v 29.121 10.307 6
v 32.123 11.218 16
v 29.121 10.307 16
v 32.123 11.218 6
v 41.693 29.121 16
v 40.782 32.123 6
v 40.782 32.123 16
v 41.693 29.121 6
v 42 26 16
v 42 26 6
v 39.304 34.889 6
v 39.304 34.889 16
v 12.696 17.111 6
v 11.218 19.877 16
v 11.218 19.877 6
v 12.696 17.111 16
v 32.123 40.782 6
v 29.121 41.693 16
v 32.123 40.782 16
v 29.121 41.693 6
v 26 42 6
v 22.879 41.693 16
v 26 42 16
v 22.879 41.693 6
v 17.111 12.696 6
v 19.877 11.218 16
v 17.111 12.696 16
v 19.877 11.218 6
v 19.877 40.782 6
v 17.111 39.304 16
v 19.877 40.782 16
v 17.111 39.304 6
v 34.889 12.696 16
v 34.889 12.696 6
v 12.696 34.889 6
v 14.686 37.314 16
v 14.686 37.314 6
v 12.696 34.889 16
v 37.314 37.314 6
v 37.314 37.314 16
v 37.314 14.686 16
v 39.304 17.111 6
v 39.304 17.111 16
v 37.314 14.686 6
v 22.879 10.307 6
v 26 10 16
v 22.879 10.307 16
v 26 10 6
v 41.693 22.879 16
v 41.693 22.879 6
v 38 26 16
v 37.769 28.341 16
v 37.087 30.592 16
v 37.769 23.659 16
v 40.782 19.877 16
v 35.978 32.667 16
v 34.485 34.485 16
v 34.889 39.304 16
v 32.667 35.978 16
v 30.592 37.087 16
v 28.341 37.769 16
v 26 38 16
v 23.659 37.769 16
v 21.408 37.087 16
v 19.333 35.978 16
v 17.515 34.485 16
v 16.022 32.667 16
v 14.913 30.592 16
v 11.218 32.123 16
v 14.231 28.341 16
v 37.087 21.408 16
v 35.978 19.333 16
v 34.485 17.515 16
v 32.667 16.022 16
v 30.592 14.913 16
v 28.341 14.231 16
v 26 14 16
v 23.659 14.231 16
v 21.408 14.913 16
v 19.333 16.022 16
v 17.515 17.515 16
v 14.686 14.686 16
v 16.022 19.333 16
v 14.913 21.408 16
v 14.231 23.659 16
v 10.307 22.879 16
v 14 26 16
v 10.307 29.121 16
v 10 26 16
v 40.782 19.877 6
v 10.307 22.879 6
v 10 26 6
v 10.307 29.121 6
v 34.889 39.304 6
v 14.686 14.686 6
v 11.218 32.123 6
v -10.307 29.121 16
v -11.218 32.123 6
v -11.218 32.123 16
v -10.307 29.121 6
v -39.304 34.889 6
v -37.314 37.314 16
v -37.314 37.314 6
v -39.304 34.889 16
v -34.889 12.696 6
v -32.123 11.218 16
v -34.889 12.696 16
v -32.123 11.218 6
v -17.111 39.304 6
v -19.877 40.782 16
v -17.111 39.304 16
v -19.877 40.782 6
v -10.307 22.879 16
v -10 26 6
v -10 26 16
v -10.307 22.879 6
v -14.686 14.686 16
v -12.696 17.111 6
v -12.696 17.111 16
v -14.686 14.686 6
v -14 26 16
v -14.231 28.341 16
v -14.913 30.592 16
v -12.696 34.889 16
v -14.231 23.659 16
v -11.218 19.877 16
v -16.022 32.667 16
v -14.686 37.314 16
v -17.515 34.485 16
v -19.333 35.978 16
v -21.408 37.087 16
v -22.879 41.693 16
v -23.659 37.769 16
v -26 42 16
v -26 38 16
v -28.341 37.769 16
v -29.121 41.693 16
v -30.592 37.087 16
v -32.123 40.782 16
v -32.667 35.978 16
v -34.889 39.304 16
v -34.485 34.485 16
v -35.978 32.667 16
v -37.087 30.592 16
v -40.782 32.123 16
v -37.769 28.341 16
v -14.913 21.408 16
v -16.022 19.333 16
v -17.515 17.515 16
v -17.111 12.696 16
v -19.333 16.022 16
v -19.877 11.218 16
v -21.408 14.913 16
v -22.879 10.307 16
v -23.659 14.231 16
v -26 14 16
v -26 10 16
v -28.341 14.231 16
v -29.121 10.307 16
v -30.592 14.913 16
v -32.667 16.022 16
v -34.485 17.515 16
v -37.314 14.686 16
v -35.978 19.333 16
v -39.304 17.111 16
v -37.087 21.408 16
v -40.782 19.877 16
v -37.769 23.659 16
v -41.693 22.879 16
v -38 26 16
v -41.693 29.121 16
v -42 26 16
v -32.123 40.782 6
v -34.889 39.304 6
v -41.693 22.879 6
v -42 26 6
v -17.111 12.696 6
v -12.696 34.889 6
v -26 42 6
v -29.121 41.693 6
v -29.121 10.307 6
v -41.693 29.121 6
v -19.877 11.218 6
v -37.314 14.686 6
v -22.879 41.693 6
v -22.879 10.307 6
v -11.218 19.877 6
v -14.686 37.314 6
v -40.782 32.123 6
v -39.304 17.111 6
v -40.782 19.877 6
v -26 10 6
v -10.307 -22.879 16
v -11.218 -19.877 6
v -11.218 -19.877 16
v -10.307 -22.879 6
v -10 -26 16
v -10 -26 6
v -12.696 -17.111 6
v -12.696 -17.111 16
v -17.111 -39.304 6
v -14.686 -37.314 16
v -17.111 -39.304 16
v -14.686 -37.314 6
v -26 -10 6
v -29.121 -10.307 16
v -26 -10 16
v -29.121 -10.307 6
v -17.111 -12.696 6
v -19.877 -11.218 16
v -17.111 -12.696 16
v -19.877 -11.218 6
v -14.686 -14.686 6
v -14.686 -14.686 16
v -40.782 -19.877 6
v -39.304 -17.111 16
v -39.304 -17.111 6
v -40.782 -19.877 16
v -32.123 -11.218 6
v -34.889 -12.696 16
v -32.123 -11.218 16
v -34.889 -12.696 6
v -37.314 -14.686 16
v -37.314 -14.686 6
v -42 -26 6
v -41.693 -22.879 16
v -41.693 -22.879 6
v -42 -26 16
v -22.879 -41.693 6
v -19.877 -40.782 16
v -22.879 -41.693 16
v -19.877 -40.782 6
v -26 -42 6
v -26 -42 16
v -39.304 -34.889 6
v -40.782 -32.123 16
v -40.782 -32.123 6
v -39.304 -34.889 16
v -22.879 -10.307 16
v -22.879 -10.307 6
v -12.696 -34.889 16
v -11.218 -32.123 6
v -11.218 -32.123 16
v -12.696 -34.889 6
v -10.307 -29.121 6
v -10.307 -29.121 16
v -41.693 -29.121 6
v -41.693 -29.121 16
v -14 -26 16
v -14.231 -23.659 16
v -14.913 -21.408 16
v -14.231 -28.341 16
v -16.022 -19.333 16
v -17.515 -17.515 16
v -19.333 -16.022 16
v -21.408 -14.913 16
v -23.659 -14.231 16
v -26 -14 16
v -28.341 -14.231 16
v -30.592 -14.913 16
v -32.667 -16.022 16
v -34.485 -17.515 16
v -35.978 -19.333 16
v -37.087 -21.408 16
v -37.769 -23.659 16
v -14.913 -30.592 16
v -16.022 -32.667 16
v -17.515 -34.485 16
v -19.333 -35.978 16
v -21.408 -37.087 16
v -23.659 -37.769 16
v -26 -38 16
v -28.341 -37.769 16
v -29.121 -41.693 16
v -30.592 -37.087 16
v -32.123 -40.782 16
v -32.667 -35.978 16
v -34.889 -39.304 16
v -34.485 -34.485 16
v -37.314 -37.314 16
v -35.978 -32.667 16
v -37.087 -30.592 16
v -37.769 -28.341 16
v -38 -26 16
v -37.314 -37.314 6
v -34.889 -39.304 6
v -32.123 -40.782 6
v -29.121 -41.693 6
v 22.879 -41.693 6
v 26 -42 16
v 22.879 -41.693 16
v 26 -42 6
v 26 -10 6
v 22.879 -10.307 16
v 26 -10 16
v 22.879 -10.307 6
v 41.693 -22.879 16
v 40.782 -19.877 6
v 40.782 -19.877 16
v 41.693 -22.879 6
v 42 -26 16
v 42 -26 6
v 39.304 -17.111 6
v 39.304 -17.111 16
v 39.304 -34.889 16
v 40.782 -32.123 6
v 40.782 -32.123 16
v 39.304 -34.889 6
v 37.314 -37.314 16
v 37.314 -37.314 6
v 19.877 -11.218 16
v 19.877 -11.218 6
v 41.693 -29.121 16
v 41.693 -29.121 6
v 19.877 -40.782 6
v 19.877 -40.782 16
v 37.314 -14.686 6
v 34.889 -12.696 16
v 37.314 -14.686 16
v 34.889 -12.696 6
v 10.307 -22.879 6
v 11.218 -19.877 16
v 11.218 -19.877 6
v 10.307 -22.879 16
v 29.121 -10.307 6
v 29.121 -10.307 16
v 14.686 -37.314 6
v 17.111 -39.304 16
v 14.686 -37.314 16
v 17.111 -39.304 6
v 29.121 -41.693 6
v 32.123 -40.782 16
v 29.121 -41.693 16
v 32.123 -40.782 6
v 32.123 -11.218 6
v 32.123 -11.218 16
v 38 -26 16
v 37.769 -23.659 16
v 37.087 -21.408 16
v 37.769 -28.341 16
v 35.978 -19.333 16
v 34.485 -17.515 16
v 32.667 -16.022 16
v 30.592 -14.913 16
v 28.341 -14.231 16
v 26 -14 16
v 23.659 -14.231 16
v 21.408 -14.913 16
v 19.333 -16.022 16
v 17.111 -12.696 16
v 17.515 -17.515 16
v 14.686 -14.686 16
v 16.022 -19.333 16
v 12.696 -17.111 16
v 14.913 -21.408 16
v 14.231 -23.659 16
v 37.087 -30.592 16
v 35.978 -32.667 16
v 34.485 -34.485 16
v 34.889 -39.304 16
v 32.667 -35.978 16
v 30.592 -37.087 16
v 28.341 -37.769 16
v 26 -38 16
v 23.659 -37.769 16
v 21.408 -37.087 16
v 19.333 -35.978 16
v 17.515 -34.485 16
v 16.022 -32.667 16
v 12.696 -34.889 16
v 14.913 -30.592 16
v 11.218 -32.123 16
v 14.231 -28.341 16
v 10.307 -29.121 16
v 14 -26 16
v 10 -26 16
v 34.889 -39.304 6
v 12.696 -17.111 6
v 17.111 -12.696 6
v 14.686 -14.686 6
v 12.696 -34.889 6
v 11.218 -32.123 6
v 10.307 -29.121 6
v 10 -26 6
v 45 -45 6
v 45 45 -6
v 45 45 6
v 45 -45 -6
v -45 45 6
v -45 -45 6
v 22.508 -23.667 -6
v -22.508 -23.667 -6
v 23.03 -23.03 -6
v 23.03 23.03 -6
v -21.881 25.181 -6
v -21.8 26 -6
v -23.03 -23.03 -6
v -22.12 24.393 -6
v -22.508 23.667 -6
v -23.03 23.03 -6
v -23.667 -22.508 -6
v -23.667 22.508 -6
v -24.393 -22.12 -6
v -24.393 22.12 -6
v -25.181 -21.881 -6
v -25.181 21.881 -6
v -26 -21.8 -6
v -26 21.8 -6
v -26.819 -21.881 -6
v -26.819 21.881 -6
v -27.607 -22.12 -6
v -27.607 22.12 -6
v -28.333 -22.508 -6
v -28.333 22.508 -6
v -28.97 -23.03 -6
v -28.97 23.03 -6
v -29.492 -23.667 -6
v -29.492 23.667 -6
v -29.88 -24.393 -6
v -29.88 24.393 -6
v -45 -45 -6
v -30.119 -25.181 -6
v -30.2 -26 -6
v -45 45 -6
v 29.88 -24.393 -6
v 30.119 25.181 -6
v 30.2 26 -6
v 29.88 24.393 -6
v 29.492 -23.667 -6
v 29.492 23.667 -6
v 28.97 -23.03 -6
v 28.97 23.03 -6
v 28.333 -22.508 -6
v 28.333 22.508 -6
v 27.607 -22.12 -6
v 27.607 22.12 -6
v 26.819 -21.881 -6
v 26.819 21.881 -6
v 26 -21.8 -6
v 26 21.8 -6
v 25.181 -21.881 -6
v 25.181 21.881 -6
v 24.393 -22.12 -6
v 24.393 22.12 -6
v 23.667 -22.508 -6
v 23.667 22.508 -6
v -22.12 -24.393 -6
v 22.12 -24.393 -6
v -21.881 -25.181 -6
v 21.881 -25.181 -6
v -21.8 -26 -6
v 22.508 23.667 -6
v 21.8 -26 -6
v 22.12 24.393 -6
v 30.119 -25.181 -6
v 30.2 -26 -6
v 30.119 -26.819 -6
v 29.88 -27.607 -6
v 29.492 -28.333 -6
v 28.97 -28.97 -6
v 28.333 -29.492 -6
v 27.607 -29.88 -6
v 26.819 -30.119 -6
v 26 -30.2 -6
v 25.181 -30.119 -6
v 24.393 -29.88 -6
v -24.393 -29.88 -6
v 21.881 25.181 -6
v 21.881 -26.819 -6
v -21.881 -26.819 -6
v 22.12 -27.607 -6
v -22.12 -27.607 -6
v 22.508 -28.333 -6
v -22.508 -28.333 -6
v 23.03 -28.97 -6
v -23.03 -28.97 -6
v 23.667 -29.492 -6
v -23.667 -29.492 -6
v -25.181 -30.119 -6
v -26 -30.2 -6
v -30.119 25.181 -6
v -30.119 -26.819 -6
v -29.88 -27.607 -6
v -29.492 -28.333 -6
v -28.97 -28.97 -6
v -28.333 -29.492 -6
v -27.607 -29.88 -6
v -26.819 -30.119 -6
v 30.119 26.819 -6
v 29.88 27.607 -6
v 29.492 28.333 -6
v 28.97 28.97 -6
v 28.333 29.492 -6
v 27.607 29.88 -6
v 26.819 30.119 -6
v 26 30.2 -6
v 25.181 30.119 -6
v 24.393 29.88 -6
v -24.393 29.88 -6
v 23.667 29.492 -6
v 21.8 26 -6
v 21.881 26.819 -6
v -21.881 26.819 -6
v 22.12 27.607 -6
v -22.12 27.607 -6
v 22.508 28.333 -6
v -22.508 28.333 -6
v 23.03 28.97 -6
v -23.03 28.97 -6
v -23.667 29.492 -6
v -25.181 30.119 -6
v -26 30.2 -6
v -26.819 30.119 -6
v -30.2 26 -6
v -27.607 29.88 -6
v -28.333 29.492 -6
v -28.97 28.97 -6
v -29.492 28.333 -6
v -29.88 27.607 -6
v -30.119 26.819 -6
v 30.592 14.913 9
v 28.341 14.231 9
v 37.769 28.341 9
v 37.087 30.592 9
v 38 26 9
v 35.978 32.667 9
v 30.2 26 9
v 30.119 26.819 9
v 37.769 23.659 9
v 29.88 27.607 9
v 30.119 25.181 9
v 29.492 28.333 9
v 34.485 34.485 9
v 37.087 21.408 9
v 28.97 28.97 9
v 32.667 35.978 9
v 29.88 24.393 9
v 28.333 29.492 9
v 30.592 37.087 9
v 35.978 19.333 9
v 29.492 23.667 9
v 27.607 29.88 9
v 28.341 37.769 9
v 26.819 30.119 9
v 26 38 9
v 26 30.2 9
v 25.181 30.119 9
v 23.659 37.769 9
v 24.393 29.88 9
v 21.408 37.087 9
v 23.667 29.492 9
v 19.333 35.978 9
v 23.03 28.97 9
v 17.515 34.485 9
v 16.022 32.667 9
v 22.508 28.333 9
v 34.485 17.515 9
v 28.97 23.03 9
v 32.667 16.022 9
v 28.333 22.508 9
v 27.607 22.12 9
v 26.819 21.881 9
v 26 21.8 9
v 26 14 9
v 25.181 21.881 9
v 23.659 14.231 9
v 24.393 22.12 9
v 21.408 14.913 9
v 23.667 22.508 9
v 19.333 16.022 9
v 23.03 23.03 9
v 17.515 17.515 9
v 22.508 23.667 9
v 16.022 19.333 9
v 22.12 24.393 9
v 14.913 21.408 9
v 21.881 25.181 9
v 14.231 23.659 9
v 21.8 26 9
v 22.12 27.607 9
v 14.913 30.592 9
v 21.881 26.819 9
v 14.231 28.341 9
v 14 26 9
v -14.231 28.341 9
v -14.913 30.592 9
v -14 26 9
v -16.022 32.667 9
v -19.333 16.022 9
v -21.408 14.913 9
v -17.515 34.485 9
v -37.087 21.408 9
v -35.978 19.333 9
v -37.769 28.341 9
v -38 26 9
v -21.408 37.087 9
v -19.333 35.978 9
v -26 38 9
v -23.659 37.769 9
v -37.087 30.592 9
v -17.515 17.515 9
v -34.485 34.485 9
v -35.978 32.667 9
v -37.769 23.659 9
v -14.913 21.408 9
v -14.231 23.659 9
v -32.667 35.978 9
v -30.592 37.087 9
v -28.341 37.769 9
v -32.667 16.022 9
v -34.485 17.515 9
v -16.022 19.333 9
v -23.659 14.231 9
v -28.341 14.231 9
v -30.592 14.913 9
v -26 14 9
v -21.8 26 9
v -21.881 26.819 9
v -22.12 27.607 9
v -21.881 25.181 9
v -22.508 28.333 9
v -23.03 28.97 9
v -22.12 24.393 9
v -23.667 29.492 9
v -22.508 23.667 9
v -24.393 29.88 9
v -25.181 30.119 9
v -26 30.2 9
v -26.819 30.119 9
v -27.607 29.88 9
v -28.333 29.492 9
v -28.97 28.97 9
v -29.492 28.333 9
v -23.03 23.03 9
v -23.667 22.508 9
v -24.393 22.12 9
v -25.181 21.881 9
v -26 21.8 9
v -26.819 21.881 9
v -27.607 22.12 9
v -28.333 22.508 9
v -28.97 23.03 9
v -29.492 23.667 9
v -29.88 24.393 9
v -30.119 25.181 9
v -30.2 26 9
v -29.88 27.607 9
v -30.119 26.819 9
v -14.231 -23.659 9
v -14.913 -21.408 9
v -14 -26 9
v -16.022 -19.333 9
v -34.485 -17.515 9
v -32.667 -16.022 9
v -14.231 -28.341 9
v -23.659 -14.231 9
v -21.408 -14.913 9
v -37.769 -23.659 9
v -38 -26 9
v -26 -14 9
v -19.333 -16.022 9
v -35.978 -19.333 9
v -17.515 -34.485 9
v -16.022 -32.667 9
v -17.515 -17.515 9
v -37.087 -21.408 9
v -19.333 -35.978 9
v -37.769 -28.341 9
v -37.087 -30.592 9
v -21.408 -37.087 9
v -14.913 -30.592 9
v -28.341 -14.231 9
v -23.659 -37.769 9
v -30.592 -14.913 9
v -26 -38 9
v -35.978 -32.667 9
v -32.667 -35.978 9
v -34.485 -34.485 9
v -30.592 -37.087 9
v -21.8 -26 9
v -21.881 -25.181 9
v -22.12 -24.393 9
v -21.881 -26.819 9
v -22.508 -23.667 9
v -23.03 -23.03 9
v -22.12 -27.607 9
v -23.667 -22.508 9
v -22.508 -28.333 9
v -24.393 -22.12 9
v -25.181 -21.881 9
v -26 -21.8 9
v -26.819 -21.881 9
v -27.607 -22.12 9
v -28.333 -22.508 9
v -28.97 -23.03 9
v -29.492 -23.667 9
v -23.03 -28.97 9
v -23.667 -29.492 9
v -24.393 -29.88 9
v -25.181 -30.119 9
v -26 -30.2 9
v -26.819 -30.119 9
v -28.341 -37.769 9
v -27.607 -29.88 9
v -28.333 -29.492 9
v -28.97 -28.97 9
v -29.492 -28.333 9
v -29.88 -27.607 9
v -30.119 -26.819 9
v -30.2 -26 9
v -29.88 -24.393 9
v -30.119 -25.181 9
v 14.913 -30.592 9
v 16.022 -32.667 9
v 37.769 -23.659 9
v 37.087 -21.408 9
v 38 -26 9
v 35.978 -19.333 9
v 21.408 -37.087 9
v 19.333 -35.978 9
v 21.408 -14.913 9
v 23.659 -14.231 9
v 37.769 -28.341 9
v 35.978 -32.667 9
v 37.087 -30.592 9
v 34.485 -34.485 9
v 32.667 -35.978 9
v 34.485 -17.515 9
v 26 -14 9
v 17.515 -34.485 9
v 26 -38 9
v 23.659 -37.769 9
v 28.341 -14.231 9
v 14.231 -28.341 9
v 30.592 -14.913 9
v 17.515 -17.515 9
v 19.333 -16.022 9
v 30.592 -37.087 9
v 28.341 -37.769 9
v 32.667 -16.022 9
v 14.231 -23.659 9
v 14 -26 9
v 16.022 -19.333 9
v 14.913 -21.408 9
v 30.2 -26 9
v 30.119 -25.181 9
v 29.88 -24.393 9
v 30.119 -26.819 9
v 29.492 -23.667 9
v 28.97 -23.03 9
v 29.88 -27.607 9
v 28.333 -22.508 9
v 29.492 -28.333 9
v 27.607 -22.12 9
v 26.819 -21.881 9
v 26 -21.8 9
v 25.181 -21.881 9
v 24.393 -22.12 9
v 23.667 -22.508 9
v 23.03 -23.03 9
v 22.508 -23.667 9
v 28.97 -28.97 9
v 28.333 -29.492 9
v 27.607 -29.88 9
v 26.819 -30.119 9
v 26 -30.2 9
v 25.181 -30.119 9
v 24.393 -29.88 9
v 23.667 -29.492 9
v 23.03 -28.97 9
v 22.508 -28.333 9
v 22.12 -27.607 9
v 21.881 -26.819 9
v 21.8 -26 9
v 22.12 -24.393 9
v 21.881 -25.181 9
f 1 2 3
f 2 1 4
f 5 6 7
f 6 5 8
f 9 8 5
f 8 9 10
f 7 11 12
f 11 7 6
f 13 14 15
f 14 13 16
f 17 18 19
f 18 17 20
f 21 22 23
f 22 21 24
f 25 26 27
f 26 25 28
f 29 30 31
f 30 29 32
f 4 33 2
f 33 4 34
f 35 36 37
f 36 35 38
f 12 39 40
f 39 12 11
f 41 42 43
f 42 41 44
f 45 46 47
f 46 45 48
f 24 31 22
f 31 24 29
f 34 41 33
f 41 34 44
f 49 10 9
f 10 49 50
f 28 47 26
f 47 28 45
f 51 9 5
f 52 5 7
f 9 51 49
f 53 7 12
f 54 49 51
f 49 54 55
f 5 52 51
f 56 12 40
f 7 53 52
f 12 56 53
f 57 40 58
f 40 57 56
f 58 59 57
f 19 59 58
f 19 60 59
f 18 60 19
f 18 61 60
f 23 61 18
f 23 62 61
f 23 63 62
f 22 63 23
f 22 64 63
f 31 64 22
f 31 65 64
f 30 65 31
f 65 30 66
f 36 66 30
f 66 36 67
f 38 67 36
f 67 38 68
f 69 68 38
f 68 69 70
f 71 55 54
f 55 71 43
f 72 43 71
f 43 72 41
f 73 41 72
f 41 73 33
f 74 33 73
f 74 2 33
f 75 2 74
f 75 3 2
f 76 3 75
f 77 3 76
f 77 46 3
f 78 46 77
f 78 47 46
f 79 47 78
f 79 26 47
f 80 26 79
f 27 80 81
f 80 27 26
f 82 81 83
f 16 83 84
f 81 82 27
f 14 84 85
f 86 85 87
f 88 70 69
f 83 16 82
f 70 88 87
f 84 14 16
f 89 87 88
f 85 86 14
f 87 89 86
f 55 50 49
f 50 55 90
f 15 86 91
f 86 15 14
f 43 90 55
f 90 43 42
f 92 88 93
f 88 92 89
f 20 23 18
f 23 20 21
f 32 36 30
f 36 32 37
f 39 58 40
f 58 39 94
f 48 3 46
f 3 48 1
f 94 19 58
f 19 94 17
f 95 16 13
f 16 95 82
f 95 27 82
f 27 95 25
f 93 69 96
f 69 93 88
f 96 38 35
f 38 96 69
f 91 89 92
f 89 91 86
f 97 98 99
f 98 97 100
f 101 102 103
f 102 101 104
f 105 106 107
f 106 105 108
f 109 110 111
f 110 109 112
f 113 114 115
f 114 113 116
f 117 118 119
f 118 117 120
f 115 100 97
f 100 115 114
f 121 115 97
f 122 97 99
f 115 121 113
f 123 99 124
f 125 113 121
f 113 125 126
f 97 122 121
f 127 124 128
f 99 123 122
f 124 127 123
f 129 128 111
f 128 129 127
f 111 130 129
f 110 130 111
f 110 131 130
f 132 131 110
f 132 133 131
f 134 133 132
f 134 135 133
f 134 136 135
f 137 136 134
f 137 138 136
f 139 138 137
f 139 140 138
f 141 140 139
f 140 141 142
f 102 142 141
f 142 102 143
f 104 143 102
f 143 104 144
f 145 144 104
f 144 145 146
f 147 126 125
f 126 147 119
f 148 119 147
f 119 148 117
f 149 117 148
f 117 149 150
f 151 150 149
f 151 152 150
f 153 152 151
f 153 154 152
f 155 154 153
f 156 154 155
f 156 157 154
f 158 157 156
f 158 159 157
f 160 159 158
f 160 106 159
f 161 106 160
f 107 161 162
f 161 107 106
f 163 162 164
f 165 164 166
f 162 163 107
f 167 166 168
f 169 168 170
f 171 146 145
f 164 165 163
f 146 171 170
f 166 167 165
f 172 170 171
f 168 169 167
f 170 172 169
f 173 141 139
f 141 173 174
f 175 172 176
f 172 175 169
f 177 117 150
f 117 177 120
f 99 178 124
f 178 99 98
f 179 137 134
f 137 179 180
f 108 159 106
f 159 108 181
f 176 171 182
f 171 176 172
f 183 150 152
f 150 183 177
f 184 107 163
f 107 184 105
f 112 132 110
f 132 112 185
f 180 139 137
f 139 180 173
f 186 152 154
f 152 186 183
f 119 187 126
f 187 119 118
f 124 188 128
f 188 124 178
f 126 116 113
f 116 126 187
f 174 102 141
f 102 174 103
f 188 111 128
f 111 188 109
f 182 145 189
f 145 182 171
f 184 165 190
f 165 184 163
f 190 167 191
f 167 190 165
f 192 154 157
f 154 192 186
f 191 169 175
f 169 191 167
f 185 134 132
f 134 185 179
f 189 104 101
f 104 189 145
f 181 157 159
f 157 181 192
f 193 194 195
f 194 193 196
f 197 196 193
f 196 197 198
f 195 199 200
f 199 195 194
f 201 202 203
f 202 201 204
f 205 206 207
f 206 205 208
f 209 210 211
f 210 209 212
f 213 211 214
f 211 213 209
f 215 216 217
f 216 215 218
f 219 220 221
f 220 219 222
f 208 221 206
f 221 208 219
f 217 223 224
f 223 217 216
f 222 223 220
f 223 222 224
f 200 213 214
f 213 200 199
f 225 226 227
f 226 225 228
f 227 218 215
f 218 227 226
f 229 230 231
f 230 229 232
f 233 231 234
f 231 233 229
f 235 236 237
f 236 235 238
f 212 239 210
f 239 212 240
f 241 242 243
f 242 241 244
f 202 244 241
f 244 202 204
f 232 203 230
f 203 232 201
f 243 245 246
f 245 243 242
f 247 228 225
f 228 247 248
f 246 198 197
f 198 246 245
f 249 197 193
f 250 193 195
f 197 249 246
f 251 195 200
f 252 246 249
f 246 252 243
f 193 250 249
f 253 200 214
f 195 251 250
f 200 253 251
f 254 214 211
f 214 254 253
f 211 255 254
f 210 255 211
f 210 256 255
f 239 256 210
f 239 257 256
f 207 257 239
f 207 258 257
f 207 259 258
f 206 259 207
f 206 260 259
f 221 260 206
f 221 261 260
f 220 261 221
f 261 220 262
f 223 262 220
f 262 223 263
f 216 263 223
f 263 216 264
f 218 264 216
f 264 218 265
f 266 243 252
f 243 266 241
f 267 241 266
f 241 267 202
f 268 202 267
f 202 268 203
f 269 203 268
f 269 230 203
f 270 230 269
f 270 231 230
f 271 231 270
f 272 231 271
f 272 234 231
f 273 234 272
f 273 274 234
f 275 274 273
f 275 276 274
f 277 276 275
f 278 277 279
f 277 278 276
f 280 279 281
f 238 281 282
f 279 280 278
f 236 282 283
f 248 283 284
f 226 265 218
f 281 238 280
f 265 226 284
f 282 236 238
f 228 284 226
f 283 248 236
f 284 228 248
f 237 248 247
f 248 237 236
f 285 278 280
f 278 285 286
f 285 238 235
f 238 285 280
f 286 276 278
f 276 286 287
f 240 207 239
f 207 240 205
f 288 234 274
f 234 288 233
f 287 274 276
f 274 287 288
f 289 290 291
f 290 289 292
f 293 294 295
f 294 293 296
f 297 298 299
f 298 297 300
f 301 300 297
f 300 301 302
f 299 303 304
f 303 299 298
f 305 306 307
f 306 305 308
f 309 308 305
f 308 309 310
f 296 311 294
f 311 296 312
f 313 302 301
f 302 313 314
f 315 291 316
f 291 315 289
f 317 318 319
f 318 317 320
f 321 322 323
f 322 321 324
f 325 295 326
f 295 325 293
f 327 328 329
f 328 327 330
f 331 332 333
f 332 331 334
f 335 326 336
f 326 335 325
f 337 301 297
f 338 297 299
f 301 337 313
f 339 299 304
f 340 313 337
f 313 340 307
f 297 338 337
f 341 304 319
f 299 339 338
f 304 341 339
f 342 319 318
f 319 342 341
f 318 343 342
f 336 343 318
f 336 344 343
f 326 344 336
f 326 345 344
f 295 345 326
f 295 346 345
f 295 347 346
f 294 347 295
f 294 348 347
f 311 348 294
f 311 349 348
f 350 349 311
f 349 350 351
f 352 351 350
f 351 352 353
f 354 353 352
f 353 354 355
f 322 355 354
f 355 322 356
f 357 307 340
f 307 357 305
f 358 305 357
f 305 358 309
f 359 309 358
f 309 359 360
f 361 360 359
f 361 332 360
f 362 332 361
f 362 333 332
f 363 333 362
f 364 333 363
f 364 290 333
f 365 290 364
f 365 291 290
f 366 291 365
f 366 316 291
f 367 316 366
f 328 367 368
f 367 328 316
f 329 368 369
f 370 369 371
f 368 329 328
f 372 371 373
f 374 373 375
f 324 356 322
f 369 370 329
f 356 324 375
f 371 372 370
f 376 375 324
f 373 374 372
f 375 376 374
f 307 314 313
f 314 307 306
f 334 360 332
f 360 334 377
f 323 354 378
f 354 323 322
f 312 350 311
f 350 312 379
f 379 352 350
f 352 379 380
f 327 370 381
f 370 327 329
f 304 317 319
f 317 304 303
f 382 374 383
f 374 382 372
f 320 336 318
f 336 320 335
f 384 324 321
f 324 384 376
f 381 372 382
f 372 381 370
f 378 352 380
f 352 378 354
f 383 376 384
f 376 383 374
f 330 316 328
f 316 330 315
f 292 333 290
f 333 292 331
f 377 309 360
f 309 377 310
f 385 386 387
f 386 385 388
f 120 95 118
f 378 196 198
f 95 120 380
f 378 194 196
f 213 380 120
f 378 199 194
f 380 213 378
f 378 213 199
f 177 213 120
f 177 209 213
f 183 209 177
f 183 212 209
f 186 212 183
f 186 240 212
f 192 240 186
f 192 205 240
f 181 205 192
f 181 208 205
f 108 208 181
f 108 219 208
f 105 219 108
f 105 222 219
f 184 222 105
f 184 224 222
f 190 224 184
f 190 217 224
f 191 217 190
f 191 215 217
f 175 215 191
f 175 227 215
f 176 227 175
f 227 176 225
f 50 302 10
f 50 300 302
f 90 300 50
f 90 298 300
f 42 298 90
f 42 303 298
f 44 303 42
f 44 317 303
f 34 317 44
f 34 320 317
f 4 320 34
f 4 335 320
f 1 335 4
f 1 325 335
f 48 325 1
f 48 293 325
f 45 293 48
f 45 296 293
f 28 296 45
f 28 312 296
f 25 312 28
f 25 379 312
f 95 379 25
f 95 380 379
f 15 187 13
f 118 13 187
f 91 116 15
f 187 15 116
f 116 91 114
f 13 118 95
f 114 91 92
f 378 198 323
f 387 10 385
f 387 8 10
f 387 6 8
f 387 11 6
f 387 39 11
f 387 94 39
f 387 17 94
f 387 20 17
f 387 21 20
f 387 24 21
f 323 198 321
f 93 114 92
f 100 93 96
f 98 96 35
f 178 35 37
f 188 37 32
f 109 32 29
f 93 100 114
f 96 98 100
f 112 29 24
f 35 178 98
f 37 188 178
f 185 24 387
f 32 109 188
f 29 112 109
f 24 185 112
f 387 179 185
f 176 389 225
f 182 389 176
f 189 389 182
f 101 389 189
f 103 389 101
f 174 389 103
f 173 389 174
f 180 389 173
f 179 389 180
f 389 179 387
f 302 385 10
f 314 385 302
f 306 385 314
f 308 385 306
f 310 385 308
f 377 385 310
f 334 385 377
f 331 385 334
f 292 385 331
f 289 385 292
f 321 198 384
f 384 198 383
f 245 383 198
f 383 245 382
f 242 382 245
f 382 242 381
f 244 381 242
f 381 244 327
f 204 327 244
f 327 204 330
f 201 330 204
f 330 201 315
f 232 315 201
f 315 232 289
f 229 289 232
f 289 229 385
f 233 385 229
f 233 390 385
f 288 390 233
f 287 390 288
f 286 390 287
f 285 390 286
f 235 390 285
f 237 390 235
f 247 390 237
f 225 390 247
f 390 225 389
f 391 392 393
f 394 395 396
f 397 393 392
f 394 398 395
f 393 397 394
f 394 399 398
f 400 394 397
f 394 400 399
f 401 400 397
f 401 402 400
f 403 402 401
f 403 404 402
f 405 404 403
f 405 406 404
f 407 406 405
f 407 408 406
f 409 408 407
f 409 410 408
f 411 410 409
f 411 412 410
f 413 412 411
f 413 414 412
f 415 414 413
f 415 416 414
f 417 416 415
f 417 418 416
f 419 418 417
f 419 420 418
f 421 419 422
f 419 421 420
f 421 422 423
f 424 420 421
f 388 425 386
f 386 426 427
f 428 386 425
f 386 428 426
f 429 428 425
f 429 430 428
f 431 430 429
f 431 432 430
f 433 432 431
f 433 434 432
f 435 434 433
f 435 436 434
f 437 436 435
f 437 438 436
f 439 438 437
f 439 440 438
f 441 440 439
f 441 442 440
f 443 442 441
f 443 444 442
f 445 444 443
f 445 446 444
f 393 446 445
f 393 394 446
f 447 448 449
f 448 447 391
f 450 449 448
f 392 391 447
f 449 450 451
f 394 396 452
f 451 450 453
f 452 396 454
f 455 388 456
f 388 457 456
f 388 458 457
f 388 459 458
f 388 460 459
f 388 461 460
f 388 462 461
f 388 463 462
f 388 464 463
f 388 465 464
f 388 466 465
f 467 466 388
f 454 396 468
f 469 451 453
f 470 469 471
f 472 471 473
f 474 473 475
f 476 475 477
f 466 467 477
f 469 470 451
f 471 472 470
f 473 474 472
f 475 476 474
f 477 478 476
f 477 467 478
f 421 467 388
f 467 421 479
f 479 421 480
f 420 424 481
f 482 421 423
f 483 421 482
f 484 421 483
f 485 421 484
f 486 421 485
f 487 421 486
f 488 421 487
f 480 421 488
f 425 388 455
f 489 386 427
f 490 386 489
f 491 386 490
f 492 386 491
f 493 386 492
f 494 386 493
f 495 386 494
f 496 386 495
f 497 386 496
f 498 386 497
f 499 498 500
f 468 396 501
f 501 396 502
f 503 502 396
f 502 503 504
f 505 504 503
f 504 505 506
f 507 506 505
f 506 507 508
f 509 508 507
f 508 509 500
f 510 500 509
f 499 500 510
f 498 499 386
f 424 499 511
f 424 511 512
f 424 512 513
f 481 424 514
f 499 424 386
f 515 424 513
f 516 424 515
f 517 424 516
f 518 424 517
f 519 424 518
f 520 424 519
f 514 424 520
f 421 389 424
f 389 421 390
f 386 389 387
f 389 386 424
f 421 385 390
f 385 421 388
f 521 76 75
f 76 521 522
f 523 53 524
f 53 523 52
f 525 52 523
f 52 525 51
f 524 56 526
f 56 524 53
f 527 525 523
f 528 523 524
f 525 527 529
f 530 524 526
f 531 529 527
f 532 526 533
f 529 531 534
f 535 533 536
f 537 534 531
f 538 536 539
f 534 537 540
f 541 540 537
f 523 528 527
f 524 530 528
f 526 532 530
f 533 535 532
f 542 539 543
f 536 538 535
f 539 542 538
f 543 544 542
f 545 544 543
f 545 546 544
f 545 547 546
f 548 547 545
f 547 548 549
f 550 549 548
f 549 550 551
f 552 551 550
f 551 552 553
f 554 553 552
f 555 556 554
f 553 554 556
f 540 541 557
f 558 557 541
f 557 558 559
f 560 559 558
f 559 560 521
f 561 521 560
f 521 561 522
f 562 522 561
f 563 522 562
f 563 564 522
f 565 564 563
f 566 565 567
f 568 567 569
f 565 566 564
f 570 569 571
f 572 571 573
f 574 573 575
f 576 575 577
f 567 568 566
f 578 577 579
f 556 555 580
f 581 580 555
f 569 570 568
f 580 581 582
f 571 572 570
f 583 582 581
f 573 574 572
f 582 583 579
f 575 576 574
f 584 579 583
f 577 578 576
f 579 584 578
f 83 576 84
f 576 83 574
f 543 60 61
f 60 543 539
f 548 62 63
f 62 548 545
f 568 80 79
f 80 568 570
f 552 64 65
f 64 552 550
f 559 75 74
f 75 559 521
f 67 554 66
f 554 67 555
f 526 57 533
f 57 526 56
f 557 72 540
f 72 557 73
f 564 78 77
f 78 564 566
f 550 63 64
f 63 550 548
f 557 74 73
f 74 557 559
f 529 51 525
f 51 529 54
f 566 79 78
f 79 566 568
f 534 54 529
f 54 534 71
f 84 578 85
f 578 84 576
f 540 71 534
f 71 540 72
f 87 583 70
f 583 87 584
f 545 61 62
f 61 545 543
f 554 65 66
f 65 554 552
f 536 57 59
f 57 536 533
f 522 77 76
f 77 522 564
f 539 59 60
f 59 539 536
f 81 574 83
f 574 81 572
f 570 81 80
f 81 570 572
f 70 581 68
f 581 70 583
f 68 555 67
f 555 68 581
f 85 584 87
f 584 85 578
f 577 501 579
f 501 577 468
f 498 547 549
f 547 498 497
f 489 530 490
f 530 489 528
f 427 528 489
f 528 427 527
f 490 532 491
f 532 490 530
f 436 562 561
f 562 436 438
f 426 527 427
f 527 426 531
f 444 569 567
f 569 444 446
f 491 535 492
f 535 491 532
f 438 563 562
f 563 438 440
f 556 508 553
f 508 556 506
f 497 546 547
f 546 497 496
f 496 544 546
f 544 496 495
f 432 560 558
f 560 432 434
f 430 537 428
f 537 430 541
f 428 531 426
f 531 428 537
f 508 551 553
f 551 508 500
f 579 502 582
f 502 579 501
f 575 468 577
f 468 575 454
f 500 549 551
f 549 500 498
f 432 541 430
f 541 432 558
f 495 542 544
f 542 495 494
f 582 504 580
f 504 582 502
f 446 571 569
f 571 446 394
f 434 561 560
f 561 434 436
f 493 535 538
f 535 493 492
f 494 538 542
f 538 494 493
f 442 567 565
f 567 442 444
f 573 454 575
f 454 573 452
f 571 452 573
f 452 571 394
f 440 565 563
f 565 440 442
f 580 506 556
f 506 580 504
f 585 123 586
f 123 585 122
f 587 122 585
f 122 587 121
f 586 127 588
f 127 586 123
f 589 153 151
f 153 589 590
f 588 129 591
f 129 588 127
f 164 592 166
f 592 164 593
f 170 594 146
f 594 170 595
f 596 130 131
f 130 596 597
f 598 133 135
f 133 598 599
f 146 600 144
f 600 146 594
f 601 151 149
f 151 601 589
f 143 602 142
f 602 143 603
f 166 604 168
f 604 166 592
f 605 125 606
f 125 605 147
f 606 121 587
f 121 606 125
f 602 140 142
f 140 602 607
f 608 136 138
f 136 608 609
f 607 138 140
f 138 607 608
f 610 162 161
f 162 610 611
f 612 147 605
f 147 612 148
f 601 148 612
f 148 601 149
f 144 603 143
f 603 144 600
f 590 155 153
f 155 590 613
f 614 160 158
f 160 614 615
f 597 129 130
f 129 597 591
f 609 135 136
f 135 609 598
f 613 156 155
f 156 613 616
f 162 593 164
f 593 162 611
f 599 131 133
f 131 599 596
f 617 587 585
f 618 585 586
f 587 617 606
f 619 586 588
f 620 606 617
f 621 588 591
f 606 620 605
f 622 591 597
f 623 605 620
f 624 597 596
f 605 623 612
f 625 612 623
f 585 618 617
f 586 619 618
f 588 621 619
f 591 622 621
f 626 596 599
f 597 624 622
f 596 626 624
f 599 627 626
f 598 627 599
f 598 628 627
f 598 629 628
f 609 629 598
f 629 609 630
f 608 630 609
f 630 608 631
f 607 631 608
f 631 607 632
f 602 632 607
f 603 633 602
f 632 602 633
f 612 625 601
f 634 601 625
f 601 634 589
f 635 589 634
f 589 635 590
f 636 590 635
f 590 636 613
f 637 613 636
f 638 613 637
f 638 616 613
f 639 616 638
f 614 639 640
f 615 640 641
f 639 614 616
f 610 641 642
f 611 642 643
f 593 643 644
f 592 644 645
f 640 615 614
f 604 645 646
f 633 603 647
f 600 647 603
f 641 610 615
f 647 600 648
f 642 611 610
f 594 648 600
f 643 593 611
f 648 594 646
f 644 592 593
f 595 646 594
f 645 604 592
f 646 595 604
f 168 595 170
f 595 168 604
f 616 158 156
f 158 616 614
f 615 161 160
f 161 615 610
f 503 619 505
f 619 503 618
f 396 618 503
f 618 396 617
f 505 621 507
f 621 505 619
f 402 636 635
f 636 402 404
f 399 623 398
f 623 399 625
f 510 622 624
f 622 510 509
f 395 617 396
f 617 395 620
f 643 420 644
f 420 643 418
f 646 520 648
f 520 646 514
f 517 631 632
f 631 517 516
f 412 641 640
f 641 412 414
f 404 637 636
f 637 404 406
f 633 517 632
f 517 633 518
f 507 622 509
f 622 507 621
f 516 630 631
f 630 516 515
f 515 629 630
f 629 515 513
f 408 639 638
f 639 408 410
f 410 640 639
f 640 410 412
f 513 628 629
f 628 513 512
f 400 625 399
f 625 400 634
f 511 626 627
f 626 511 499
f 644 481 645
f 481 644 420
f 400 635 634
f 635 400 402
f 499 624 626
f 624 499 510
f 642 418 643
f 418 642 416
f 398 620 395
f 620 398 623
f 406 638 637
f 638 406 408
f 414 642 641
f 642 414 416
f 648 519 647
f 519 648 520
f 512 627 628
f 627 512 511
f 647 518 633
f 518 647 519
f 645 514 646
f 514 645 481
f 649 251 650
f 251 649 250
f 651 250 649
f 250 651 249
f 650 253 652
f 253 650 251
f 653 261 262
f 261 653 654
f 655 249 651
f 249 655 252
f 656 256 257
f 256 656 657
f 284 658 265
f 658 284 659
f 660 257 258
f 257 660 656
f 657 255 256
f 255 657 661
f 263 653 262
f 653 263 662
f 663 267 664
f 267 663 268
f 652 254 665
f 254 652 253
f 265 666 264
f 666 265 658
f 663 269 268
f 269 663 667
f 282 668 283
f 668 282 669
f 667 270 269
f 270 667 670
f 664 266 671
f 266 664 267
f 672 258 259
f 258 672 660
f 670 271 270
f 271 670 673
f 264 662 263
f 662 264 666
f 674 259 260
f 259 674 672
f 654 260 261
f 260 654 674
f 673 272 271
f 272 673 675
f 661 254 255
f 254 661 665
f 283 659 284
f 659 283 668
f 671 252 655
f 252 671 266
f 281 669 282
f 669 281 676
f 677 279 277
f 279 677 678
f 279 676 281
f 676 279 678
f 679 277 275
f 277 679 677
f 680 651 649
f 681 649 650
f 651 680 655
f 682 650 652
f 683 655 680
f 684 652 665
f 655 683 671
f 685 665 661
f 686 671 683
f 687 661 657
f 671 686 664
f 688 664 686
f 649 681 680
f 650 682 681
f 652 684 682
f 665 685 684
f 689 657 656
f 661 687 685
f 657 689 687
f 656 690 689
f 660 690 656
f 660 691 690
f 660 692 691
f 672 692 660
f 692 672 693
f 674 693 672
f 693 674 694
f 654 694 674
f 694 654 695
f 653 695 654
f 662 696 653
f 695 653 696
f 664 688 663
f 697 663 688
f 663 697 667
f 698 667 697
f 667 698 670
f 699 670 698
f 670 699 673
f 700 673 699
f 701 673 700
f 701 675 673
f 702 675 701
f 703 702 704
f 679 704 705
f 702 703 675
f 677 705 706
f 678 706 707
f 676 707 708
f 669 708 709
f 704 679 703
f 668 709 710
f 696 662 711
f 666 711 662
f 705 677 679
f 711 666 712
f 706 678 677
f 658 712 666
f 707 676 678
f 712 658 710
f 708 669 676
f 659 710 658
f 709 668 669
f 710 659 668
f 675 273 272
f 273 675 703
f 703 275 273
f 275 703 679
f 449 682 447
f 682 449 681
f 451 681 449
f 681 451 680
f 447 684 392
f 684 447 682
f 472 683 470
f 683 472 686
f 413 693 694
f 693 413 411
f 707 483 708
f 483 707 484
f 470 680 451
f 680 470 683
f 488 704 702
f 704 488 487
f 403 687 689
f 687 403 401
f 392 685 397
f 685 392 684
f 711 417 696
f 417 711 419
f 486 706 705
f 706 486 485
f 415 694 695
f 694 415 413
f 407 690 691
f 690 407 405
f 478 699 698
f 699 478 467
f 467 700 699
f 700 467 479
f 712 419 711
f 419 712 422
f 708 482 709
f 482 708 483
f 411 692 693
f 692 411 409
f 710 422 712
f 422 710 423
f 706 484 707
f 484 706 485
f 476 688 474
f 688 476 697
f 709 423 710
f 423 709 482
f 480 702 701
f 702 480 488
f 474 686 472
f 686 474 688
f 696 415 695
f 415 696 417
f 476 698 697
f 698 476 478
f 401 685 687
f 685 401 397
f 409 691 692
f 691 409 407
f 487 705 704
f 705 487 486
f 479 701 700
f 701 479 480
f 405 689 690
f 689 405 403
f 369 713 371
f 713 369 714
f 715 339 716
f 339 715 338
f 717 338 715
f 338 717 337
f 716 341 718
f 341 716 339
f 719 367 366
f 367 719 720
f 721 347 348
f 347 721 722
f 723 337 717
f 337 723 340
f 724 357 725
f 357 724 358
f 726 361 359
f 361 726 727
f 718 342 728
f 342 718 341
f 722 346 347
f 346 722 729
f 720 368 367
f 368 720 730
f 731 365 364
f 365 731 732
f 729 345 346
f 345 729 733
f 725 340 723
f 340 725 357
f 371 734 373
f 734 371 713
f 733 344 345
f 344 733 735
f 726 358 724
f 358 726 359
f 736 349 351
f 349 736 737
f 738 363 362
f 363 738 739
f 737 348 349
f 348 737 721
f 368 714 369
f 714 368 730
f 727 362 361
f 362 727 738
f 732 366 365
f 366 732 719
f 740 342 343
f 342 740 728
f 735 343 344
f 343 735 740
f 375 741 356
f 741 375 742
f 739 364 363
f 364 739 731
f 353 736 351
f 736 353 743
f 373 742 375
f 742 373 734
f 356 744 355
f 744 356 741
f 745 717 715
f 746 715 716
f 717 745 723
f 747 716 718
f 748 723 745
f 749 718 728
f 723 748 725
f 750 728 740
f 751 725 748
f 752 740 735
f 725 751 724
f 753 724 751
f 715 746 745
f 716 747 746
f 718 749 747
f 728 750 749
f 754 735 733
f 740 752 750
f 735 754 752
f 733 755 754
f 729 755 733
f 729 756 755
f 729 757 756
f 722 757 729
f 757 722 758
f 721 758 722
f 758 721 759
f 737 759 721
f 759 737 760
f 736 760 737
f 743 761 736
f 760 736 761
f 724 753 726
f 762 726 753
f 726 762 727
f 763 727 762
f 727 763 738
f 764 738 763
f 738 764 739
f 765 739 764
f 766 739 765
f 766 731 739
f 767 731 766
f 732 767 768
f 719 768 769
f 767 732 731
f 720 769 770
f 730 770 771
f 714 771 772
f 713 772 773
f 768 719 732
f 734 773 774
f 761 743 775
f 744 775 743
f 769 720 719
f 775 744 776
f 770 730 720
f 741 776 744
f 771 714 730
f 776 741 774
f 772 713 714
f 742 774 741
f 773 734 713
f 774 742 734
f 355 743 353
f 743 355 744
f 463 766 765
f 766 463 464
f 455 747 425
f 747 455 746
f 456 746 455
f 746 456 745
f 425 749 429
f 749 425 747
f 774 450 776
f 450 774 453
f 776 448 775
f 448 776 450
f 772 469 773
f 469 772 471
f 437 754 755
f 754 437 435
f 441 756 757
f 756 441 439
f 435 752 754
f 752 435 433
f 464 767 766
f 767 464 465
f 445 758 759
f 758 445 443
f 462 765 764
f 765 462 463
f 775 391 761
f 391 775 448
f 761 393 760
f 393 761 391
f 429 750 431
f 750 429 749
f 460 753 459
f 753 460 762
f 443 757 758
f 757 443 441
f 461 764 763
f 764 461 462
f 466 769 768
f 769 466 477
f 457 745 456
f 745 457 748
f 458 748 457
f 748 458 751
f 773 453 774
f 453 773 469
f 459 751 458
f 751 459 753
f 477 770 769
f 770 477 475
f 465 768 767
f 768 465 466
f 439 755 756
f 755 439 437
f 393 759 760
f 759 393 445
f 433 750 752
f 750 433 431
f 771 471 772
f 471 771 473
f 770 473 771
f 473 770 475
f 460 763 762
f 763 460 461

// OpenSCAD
$fn = 32;

// ----------------------------------------------------------------------
// Socket pad plate
// bosses with counterbored sockets for the screws
// ----------------------------------------------------------------------

// --- parameters (mm) ---
base_t = 12;           // base plate thickness
boss_h = 10;           // boss height above the base plate
boss_d = 32;           // boss diameter
socket_d = 24;         // socket diameter
socket_depth = 7;      // socket depth from the boss face
bolt_d = 8.4;          // screw clearance hole through the socket floor
plate = [90, 90, 12];  // overall size (x, y, z)
edge = 19;             // boss centre offset from the plate edge
pads = 4;              // boss count, one per corner

// --- derived feature positions (mm) ---
height = base_t + boss_h;        // = 22   overall height of the part
corner_x = plate[0] / 2 - edge;  // = 26   boss centre X
corner_y = plate[1] / 2 - edge;  // = 26   boss centre Y
feature_centers = [
  [corner_x, corner_y],
  [-corner_x, corner_y],
  [-corner_x, -corner_y],
  [corner_x, -corner_y]
];   // boss centres: sockets, holes and the pads themselves are placed from here

// base plate, bosses on feature_centers, socket + through hole in each
difference() {
  union() {
    cube(plate, center = true);
    for (centre = feature_centers)
      translate([centre[0], centre[1], plate[2] / 2 - 1])
        cylinder(d = boss_d, h = boss_h + 1);
  }
  for (centre = feature_centers) {
    translate([centre[0], centre[1], plate[2] / 2 + boss_h - socket_depth])
      cylinder(d = socket_d, h = socket_depth + 1);
    translate([centre[0], centre[1], -height])
      cylinder(d = bolt_d, h = 2 * height + 2);  // through the socket floor
  }
}
